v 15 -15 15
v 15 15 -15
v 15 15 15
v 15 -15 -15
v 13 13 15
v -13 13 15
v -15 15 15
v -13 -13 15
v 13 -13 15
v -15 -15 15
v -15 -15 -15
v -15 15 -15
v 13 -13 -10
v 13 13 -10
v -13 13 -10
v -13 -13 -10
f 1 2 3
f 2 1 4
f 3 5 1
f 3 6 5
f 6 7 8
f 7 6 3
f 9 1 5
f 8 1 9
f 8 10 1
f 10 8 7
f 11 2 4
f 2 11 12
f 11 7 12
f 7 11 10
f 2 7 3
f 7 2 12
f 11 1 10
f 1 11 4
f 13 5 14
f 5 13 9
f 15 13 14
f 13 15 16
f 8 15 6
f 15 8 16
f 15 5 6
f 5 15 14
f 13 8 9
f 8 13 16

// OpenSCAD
difference() {
	cube(30, center=true);
	translate([0,0,3])cube(26, center=true);
}
